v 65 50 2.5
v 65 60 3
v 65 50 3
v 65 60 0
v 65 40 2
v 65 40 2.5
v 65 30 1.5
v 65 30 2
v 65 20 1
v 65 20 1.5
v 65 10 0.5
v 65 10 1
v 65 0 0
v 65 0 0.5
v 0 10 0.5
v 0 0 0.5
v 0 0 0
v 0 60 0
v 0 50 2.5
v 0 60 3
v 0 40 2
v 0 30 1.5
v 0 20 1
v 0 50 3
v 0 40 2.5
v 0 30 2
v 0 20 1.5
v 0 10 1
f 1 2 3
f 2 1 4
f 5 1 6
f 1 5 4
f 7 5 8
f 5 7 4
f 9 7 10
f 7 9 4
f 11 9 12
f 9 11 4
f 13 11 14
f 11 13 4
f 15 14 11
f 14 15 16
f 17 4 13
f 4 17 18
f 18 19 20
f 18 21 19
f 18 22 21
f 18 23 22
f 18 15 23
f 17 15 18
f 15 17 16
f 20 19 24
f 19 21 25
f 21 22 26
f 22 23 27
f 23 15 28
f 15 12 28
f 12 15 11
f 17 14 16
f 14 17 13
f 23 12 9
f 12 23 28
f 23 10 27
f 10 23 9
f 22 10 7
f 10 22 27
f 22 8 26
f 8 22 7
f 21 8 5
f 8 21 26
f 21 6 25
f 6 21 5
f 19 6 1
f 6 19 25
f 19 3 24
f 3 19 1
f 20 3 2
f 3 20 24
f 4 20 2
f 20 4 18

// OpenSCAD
width=65;
step_length=10;
step_height=.5;
num_steps=6;

module steps() {
    for(i = [0:num_steps-1]) {
        translate([0, step_length*i, 0])
        cube([width, step_length, (i+1)*step_height], center=false);
    }
}

steps();
